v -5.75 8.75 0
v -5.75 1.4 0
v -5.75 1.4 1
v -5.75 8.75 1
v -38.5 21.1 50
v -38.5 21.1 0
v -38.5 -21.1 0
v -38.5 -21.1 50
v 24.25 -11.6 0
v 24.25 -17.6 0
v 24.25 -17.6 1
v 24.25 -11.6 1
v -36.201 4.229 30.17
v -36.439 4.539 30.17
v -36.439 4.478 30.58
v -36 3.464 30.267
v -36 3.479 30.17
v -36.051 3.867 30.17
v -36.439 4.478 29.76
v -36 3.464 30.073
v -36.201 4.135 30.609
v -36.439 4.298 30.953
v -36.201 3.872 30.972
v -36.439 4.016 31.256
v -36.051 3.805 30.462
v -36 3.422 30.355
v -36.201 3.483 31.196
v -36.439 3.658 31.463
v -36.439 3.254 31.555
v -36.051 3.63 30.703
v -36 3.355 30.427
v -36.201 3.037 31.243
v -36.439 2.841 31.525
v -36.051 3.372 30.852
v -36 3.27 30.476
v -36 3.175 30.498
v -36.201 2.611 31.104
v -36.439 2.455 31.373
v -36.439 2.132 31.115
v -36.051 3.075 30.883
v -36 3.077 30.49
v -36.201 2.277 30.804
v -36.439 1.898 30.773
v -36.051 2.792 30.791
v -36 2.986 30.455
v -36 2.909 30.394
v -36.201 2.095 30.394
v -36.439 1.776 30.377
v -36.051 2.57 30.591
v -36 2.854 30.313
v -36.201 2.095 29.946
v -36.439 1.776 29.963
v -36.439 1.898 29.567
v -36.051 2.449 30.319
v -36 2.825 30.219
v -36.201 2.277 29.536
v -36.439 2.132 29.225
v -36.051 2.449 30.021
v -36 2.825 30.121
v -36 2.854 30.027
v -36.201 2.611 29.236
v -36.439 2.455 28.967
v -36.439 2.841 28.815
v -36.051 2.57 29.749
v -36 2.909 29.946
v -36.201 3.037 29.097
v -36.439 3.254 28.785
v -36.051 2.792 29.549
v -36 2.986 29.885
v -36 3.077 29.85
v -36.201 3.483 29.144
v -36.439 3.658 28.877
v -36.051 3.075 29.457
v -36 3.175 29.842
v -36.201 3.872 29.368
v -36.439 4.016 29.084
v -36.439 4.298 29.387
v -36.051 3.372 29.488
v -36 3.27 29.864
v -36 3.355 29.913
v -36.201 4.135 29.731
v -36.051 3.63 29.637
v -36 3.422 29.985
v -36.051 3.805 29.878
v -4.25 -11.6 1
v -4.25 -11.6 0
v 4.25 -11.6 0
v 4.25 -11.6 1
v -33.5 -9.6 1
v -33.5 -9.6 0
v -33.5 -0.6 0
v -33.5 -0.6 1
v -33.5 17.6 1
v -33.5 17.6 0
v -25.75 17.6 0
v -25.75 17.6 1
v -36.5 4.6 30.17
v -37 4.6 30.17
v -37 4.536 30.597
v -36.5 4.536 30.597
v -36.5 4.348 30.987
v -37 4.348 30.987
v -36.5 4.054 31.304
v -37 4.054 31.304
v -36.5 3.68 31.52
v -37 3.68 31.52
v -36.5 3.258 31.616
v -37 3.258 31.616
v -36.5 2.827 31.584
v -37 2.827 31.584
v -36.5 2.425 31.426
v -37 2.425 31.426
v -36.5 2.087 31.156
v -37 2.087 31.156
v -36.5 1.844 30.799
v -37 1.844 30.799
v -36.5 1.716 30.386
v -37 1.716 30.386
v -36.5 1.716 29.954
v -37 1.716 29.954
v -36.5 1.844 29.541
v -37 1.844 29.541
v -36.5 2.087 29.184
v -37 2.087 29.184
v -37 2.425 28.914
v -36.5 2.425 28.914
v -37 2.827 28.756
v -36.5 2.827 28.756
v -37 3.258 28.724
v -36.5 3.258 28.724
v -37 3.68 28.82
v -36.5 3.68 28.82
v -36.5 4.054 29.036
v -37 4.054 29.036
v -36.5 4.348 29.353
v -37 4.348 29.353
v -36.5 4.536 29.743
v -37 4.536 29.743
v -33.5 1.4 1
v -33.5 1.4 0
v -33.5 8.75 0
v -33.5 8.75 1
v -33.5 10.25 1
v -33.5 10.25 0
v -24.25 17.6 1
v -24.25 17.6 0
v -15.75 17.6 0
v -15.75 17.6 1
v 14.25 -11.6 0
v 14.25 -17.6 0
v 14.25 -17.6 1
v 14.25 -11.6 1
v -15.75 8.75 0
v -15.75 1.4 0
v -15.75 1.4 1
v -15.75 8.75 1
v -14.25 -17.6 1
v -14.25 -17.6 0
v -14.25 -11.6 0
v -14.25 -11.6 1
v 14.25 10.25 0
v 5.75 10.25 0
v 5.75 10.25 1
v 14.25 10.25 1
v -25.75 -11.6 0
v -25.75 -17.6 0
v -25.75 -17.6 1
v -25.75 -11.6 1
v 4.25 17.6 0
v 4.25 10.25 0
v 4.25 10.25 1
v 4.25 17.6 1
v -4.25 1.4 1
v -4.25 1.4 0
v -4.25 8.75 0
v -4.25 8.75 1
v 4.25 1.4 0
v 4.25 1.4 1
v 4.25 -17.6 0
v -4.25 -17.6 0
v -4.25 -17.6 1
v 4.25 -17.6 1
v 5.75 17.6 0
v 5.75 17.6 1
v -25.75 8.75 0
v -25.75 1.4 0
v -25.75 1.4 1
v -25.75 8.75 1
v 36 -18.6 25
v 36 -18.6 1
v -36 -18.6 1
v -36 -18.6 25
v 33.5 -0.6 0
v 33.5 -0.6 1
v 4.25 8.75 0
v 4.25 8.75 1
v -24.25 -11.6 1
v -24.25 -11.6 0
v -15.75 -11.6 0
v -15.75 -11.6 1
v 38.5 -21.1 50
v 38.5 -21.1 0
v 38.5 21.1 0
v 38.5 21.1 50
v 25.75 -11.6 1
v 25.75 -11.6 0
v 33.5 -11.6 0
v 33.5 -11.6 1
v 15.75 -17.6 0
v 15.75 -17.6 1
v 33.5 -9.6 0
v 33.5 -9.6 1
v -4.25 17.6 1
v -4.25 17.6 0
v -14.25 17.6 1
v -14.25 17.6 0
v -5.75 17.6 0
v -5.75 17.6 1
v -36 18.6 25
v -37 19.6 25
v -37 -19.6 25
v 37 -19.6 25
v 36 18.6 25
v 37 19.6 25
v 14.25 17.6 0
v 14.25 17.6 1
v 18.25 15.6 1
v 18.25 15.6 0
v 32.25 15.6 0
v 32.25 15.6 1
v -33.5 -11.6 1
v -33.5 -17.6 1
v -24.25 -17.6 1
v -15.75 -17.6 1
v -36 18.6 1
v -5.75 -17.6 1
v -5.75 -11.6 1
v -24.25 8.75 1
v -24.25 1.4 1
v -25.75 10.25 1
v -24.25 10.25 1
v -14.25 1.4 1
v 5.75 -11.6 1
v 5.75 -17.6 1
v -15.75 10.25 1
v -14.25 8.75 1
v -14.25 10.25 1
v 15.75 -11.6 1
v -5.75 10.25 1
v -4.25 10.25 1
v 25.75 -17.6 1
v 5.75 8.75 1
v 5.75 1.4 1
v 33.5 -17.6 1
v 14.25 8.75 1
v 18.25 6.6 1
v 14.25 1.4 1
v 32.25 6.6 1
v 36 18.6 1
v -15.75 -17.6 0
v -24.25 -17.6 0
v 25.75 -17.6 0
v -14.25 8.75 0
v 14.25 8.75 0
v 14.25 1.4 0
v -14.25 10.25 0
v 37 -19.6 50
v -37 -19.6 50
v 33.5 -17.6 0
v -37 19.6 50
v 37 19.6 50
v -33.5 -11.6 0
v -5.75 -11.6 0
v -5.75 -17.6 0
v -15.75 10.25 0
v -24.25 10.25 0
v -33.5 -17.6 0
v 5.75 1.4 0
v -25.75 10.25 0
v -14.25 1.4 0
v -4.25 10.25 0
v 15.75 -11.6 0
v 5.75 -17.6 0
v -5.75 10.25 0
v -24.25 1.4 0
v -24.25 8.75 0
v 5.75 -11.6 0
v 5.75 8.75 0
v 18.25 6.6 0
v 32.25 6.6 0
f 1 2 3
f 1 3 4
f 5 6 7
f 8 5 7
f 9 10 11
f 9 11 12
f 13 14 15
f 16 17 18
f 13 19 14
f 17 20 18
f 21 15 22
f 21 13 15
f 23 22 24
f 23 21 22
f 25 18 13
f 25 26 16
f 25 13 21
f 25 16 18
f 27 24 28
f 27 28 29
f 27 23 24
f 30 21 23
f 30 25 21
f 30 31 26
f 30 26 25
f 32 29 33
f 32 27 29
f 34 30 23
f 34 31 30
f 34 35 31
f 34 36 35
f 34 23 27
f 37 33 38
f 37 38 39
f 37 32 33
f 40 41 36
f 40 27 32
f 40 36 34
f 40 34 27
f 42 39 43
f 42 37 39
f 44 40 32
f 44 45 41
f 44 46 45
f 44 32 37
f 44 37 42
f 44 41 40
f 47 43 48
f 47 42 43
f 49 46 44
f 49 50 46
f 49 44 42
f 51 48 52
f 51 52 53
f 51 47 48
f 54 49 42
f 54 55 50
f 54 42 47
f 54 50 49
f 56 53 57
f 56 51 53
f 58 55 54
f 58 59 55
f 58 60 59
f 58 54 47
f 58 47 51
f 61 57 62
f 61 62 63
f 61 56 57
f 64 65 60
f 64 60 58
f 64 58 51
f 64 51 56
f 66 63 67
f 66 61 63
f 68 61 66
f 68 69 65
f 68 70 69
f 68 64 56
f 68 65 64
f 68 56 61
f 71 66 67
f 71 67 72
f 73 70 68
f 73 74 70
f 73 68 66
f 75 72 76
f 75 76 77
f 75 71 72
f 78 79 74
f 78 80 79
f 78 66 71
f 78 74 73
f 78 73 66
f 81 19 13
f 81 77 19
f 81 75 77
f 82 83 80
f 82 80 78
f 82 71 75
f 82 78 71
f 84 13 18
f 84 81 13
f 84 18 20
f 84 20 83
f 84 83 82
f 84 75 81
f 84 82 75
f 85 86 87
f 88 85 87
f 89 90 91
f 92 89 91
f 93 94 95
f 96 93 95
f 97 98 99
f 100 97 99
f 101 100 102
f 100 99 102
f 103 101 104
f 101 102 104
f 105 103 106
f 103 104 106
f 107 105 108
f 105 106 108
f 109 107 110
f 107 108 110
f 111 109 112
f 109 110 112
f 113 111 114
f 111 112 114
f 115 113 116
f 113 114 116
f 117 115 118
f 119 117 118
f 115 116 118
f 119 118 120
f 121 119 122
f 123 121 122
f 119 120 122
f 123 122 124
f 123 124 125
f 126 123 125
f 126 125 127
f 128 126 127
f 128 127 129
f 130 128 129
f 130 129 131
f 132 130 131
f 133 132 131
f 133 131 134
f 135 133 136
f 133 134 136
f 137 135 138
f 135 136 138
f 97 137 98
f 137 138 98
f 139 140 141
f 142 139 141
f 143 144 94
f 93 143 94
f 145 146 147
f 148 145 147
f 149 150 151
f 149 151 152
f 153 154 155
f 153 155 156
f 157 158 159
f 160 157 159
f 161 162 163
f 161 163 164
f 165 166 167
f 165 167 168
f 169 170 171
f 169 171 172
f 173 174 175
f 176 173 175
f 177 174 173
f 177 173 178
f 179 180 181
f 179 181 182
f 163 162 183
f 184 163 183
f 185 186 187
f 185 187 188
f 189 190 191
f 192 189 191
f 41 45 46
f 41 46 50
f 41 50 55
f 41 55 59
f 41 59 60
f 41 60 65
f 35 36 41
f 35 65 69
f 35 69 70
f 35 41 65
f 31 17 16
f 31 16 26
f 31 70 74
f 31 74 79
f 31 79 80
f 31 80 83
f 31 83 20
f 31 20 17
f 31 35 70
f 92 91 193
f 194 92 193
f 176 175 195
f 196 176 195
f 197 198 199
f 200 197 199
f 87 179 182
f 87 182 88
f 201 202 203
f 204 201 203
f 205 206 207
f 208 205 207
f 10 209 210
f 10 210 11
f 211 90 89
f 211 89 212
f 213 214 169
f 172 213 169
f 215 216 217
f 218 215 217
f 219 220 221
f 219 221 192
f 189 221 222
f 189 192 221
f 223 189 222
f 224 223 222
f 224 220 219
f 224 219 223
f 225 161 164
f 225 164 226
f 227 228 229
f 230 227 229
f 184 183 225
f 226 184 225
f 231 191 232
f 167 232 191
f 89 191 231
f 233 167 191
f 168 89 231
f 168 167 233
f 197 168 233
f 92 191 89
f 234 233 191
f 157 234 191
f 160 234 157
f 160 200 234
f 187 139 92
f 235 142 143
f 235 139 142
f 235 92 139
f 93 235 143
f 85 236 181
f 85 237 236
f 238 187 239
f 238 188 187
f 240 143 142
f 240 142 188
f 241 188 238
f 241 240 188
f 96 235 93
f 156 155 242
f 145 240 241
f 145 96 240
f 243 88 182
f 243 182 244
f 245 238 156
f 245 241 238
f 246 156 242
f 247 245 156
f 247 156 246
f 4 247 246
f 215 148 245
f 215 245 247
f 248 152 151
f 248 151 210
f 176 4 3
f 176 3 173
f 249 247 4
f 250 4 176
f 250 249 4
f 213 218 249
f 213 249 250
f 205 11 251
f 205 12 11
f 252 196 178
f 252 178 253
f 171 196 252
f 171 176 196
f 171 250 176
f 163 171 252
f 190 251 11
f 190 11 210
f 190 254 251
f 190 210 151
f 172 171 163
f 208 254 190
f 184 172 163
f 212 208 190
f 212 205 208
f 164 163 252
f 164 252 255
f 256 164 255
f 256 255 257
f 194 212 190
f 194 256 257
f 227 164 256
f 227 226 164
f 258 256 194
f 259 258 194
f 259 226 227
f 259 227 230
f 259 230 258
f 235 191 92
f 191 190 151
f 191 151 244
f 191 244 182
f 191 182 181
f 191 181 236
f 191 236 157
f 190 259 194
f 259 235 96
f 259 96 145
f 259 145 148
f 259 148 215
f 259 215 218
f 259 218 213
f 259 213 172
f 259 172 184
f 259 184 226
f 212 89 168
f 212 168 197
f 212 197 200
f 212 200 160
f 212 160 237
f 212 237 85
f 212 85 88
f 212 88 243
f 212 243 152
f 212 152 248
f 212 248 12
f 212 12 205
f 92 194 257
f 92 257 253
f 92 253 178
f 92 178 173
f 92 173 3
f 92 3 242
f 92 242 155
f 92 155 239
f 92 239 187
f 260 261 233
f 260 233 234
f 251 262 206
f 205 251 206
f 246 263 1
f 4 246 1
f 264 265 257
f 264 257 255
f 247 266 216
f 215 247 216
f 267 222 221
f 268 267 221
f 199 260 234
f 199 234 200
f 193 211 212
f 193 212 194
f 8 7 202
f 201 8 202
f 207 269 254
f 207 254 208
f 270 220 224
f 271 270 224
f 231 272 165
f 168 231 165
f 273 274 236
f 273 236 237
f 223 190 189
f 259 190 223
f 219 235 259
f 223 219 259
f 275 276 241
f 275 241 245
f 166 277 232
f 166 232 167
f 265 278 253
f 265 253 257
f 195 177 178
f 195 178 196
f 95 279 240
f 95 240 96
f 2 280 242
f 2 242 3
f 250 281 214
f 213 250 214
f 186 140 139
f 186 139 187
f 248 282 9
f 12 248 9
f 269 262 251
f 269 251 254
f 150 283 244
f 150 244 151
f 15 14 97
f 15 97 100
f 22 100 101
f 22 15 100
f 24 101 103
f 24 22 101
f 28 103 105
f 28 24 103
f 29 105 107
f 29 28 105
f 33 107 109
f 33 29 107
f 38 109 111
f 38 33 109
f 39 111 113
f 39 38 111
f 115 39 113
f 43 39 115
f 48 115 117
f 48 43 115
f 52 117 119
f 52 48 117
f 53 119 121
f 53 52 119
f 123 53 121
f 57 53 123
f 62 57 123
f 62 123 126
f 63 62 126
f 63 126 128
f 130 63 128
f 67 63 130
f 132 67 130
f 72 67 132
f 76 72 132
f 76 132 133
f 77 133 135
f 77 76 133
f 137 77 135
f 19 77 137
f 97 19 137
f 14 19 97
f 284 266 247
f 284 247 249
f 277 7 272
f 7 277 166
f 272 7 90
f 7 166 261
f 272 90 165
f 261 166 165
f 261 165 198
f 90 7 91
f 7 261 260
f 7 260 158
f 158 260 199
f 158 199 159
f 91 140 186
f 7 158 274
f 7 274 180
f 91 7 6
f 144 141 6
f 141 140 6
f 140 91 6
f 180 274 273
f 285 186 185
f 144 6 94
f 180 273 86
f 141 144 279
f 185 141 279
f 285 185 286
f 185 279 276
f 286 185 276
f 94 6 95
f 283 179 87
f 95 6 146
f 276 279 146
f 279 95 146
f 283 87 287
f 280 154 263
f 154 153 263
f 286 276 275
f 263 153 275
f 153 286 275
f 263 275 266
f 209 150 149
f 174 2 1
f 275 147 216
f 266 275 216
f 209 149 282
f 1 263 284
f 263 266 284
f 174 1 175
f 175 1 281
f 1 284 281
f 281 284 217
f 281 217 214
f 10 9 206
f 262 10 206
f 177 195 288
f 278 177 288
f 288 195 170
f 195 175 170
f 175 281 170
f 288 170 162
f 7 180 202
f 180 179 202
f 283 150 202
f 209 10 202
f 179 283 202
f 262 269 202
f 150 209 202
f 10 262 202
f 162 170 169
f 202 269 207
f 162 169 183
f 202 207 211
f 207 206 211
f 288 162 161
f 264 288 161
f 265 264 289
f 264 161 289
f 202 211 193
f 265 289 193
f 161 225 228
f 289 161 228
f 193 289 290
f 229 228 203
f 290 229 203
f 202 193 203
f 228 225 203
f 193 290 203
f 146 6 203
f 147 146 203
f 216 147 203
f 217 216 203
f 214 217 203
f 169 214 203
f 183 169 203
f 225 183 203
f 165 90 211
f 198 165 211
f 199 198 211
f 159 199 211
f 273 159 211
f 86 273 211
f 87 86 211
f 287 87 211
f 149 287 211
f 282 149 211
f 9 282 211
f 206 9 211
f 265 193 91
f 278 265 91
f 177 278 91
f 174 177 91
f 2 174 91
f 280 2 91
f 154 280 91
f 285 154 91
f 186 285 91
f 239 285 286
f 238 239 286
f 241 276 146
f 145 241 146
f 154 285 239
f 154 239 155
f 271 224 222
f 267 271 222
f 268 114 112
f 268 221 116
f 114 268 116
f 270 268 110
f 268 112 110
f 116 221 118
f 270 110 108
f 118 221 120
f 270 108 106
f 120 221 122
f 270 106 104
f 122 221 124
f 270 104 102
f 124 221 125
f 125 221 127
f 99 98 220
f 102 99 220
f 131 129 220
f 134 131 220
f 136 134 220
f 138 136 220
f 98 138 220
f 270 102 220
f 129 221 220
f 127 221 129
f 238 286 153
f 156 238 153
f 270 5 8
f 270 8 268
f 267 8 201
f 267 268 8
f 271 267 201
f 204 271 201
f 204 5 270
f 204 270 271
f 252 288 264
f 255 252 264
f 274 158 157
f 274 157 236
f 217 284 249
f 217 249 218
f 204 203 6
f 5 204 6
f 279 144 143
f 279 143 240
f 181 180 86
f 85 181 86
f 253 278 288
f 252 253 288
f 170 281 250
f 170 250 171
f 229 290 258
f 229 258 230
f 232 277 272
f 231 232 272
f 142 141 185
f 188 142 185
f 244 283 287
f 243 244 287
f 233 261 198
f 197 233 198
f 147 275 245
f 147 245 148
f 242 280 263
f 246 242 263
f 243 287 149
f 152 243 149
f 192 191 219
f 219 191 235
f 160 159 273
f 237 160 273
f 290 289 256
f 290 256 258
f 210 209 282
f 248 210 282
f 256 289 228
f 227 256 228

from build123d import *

# Parameters (mm, degrees)
F0_W     = 72
F0_H     = 37.2
F0_W_2   = 7.75
F0_H_2   = 6
F0_W_3   = 8.5
F0_W_4   = 67
F0_H_3   = 9
F0_H_4   = 7.35
F0_W_5   = 14
F1_DEPTH = 1
F0_W_6   = 1
F2_DEPTH = 25
F3_DEPTH = 50
F5_R     = 1.45
F6_DEPTH = 1
F7_SIZE  = 0.5
F8_R     = 1.5


with BuildPart() as f1:
    # F0 (on Top) → F1 (new body)
    with BuildSketch(Plane.XY):
        Rectangle(F0_W, F0_H)
        with Locations((-29.625, -14.6)):
            Rectangle(F0_W_2, F0_H_2, mode=Mode.SUBTRACT)
        with Locations((-20, -14.6)):
            Rectangle(F0_W_3, F0_H_2, mode=Mode.SUBTRACT)
        with Locations((-10, -14.6)):
            Rectangle(F0_W_3, F0_H_2, mode=Mode.SUBTRACT)
        with Locations((0, -14.6)):
            Rectangle(F0_W_3, F0_H_2, mode=Mode.SUBTRACT)
        with Locations((10, -14.6)):
            Rectangle(F0_W_3, F0_H_2, mode=Mode.SUBTRACT)
        with Locations((20, -14.6)):
            Rectangle(F0_W_3, F0_H_2, mode=Mode.SUBTRACT)
        with Locations((29.625, -14.6)):
            Rectangle(F0_W_2, F0_H_2, mode=Mode.SUBTRACT)
        with Locations((0, -5.1)):
            Rectangle(F0_W_4, F0_H_3, mode=Mode.SUBTRACT)
        with Locations((-29.625, 5.075)):
            Rectangle(F0_W_2, F0_H_4, mode=Mode.SUBTRACT)
        with Locations((-20, 5.075)):
            Rectangle(F0_W_3, F0_H_4, mode=Mode.SUBTRACT)
        with Locations((-10, 5.075)):
            Rectangle(F0_W_3, F0_H_4, mode=Mode.SUBTRACT)
        with Locations((-29.625, 13.925)):
            Rectangle(F0_W_2, F0_H_4, mode=Mode.SUBTRACT)
        with Locations((-20, 13.925)):
            Rectangle(F0_W_3, F0_H_4, mode=Mode.SUBTRACT)
        with Locations((-10, 13.925)):
            Rectangle(F0_W_3, F0_H_4, mode=Mode.SUBTRACT)
        with Locations((0, 5.075)):
            Rectangle(F0_W_3, F0_H_4, mode=Mode.SUBTRACT)
        with Locations((10, 5.075)):
            Rectangle(F0_W_3, F0_H_4, mode=Mode.SUBTRACT)
        with Locations((0, 13.925)):
            Rectangle(F0_W_3, F0_H_4, mode=Mode.SUBTRACT)
        with Locations((10, 13.925)):
            Rectangle(F0_W_3, F0_H_4, mode=Mode.SUBTRACT)
        with Locations((25.25, 11.1)):
            Rectangle(F0_W_5, F0_H_3, mode=Mode.SUBTRACT)
    extrude(amount=F1_DEPTH)

    # F0 (on Top) → F2 (join)
    with BuildSketch(Plane.XY):
        Polygon((36, 18.6), (37, 18.6), (37, 19.6), (-37, 19.6), (-37, 18.6), (-36, 18.6), align=None)
        Polygon((37, -19.6), (37, -18.6), (36, -18.6), (-36, -18.6), (-37, -18.6), (-37, -19.6), align=None)
        with Locations((-36.5, 0)):
            Rectangle(F0_W_6, F0_H)
        with Locations((36.5, 0)):
            Rectangle(F0_W_6, F0_H)
    extrude(amount=F2_DEPTH)

    # F0 (on Top) → F3 (join)
    with BuildSketch(Plane.XY):
        Polygon((38.5, -19.6), (37, -19.6), (-37, -19.6), (-38.5, -19.6), (-38.5, -21.1), (38.5, -21.1), align=None)
        Polygon((-37, 18.6), (-37, 19.6), (-38.5, 19.6), (-38.5, -19.6), (-37, -19.6), (-37, -18.6), align=None)
        Polygon((37, 19.6), (37, 18.6), (37, -18.6), (37, -19.6), (38.5, -19.6), (38.5, 19.6), align=None)
        Polygon((-37, 19.6), (37, 19.6), (38.5, 19.6), (38.5, 21.1), (-38.5, 21.1), (-38.5, 19.6), align=None)
    extrude(amount=F3_DEPTH)

    # F5 (on face) → F6 (join)
    with BuildSketch(Plane.YZ.offset(-37)):
        with Locations((3.15, 30.17)):
            Circle(F5_R)
    extrude(amount=F6_DEPTH)

    # F7
    f7_edges = [f1.edges().sort_by_distance(p)[0] for p in [
        (-36, 1.7, 30.17),
    ]]
    chamfer(f7_edges, length=F7_SIZE)

    # F8
    f8_edges = [f1.edges().sort_by_distance(p)[0] for p in [
        (-36, 2.2, 30.17),
    ]]
    fillet(f8_edges, radius=F8_R)


solid = f1.part
